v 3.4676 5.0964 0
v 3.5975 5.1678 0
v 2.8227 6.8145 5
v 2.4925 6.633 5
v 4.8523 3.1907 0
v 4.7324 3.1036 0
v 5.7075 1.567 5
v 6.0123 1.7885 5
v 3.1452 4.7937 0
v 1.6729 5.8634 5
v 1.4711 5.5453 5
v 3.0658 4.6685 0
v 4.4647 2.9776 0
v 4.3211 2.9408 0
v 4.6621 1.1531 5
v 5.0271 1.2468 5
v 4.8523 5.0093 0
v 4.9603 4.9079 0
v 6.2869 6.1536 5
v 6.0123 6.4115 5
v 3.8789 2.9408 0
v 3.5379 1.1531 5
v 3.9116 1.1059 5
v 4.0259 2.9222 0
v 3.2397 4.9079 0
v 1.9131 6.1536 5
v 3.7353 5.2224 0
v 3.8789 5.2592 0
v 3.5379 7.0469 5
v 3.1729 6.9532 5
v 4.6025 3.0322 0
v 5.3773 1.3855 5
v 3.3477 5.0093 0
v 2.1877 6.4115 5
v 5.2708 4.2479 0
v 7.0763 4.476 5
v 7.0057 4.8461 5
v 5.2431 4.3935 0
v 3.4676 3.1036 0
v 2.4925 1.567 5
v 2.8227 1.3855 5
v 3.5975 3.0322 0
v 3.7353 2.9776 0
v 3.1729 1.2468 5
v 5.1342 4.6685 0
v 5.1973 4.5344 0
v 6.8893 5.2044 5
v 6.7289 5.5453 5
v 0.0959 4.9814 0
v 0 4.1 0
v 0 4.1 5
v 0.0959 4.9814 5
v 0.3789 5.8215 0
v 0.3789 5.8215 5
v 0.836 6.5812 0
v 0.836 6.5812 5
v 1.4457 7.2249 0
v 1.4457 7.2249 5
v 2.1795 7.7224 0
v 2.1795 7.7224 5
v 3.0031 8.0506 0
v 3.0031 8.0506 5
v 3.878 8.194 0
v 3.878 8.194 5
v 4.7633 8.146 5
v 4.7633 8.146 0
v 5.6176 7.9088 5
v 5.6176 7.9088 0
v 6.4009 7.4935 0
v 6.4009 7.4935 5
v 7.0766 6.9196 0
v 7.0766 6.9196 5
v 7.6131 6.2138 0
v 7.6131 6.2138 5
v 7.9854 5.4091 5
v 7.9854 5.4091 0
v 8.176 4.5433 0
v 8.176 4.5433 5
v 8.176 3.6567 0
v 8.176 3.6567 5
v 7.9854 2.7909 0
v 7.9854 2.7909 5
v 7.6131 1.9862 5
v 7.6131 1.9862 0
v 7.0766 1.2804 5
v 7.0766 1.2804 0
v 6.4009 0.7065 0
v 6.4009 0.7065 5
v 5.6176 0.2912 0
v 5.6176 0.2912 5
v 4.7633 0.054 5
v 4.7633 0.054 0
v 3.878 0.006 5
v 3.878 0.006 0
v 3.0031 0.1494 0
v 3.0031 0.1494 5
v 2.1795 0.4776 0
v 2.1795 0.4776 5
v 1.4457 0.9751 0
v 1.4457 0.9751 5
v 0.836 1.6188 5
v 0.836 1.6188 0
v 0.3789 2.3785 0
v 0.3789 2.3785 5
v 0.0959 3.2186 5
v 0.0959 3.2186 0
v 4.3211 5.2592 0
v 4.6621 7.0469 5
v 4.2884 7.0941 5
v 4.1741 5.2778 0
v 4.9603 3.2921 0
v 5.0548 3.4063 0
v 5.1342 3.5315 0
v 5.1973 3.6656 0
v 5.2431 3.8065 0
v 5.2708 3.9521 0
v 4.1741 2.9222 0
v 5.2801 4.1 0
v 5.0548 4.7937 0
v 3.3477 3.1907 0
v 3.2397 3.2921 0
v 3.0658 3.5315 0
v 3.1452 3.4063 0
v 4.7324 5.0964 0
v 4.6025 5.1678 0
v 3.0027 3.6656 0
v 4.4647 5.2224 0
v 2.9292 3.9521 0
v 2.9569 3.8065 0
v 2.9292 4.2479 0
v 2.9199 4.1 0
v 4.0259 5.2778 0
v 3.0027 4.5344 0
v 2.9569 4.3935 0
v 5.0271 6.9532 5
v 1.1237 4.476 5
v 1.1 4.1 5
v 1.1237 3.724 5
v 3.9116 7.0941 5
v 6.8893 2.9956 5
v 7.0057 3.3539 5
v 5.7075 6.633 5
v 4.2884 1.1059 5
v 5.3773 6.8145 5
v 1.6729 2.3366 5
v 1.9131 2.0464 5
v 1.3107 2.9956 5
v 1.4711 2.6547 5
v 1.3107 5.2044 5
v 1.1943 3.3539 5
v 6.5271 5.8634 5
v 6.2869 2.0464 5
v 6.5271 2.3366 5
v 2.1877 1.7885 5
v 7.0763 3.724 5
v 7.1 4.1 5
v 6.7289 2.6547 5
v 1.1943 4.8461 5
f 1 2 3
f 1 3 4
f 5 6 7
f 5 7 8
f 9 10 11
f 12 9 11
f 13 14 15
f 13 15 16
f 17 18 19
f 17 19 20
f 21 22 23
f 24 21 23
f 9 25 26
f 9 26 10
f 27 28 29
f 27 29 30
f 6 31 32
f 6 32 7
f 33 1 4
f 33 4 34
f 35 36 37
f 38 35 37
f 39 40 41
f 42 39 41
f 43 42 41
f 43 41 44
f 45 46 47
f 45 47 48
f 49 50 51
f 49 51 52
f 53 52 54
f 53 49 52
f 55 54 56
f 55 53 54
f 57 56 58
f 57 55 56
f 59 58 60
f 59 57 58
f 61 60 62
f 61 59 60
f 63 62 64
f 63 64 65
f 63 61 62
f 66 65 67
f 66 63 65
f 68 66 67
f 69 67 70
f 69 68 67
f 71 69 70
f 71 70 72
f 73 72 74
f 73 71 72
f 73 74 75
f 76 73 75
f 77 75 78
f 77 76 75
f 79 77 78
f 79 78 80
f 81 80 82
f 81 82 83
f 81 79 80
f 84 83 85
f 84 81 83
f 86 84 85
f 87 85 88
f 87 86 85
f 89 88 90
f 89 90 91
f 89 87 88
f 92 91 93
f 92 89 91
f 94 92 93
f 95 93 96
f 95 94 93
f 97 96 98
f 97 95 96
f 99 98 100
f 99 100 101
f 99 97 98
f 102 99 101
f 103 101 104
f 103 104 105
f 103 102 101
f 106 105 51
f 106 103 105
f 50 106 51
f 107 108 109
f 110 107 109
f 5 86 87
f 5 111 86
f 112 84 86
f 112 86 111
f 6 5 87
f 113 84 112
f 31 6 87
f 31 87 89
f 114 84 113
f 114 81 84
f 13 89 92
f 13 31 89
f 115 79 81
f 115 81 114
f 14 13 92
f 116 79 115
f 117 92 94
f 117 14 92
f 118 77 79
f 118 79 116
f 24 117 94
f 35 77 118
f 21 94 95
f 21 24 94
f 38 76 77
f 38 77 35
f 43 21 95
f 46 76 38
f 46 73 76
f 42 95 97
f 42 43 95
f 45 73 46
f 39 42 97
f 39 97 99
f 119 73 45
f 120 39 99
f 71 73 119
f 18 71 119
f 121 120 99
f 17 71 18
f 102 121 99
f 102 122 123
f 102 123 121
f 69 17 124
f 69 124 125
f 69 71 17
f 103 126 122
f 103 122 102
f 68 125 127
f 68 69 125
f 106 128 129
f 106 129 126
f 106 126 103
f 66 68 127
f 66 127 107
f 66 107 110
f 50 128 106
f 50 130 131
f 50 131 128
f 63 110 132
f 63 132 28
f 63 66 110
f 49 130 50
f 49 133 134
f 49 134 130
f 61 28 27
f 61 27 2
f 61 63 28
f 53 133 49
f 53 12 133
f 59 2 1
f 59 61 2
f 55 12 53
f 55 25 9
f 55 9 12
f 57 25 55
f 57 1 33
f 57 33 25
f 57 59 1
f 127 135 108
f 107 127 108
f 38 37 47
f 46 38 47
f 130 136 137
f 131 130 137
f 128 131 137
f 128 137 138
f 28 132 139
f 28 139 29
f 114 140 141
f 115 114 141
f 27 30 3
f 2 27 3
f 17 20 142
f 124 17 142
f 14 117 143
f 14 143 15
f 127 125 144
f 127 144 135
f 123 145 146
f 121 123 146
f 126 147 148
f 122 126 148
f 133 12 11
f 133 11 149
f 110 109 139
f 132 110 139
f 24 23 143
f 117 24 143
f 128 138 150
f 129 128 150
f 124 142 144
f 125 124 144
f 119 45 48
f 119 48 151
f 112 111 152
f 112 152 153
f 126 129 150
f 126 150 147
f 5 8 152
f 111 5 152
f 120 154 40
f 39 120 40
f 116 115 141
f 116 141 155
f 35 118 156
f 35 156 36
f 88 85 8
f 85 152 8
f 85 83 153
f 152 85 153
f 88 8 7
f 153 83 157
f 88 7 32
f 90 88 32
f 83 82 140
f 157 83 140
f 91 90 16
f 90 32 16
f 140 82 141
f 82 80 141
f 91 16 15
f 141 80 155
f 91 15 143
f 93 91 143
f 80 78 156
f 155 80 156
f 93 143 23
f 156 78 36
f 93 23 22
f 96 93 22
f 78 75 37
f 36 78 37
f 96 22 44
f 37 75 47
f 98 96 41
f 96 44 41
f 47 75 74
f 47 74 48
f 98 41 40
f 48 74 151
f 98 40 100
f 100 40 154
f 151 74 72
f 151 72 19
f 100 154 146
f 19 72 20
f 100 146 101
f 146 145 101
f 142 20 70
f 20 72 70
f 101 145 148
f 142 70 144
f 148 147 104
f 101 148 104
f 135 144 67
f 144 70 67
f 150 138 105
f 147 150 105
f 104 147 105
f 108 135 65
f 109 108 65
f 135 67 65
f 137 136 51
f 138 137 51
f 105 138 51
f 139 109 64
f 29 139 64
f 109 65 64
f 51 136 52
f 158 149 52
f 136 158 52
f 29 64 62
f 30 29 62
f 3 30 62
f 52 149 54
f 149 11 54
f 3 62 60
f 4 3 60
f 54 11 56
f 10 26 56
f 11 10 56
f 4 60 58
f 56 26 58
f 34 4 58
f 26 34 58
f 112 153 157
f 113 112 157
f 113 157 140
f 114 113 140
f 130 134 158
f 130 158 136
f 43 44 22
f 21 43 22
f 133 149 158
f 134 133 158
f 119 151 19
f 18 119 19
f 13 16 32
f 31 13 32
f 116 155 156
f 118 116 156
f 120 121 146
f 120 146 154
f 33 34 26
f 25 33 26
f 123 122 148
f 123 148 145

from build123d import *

# Parameters (mm, degrees)
ESQUISSE1_R             = 4.1
BOSS_EXTRU_1_DEPTH      = 5
ENL_V_MAT_EXTRU_1_DEPTH = 13.628539086
D_POUILLE1_ANGLE        = 19.963654133


with BuildPart() as part:
    # Esquisse1 → Boss.-Extru.1 (new body)
    with BuildSketch(Plane(origin=(0, 0, 0), x_dir=(-1, 0, 0), z_dir=(0, 0, -1))):
        with Locations((-4.099999911, 4.100000055)):
            Circle(ESQUISSE1_R)
    extrude(amount=-BOSS_EXTRU_1_DEPTH)

    # Esquisse2 → Enlèv. mat.-Extru.1 (cut, through all)
    with BuildSketch(Plane.XY.offset(5)):
        Polygon((7.076344, 4.476), (7.005749, 4.846069), (6.889329, 5.204373), (6.72892, 5.545261), (6.527051, 5.863356), (6.286906, 6.153641), (6.012272, 6.41154), (5.70748, 6.632984), (5.377338, 6.814481), (5.027051, 6.95317), (4.662144, 7.046862), (4.288372, 7.09408), (3.911628, 7.09408), (3.537856, 7.046862), (3.172949, 6.95317), (2.822662, 6.814481), (2.49252, 6.632984), (2.187728, 6.41154), (1.913094, 6.153641), (1.672949, 5.863356), (1.47108, 5.545261), (1.31067, 5.204373), (1.194251, 4.846069), (1.123656, 4.476), (1.1, 4.1), (1.123656, 3.724), (1.194251, 3.35393), (1.31067, 2.995626), (1.47108, 2.654739), (1.672949, 2.336644), (1.913094, 2.046359), (2.187728, 1.78846), (2.49252, 1.567016), (2.822662, 1.385519), (3.172949, 1.24683), (3.537856, 1.153138), (3.911628, 1.10592), (4.288372, 1.10592), (4.662144, 1.153138), (5.027051, 1.24683), (5.377338, 1.385519), (5.70748, 1.567016), (6.012272, 1.78846), (6.286906, 2.046359), (6.527051, 2.336644), (6.72892, 2.654739), (6.889329, 2.995626), (7.005749, 3.35393), (7.076344, 3.724), (7.1, 4.1), align=None)
    extrude(amount=-ENL_V_MAT_EXTRU_1_DEPTH, mode=Mode.SUBTRACT)

    # Dépouille1
    d_pouille1_faces = [part.faces().sort_by_distance(p)[0] for p in [
        (7.0410465, 4.6610345, 2.5),
        (6.947539, 5.025221, 2.5),
        (6.8091245, 5.374817, 2.5),
        (6.6279855, 5.7043085, 2.5),
        (6.4069785, 6.0084985, 2.5),
        (6.149589, 6.2825905, 2.5),
        (5.859876, 6.522262, 2.5),
        (5.542409, 6.7237325, 2.5),
        (5.2021945, 6.8838255, 2.5),
        (4.8445975, 7.000016, 2.5),
        (4.475258, 7.070471, 2.5),
        (4.1, 7.09408, 2.5),
        (3.724742, 7.070471, 2.5),
        (3.3554025, 7.000016, 2.5),
        (2.9978055, 6.8838255, 2.5),
        (2.657591, 6.7237325, 2.5),
        (2.340124, 6.522262, 2.5),
        (2.050411, 6.2825905, 2.5),
        (1.7930215, 6.0084985, 2.5),
        (1.5720145, 5.7043085, 2.5),
        (1.390875, 5.374817, 2.5),
        (1.2524605, 5.025221, 2.5),
        (1.1589535, 4.6610345, 2.5),
        (1.111828, 4.288, 2.5),
        (1.111828, 3.912, 2.5),
        (1.1589535, 3.538965, 2.5),
        (1.2524605, 3.174778, 2.5),
        (1.390875, 2.8251825, 2.5),
        (1.5720145, 2.4956915, 2.5),
        (1.7930215, 2.1915015, 2.5),
        (2.050411, 1.9174095, 2.5),
        (2.340124, 1.677738, 2.5),
        (2.657591, 1.4762675, 2.5),
        (2.9978055, 1.3161745, 2.5),
        (3.3554025, 1.199984, 2.5),
        (3.724742, 1.129529, 2.5),
        (4.1, 1.10592, 2.5),
        (4.475258, 1.129529, 2.5),
        (4.8445975, 1.199984, 2.5),
        (5.2021945, 1.3161745, 2.5),
        (5.542409, 1.4762675, 2.5),
        (5.859876, 1.677738, 2.5),
        (6.149589, 1.9174095, 2.5),
        (6.4069785, 2.1915015, 2.5),
        (6.6279855, 2.4956915, 2.5),
        (6.8091245, 2.8251825, 2.5),
        (6.947539, 3.174778, 2.5),
        (7.0410465, 3.538965, 2.5),
        (7.088172, 3.912, 2.5),
        (7.088172, 4.288, 2.5),
    ]]
    draft(d_pouille1_faces, Plane(origin=(4.099999911, 4.100000055, 5), x_dir=(1, 0, 0), z_dir=(0, 0, 1)), D_POUILLE1_ANGLE)


solid = part.part
